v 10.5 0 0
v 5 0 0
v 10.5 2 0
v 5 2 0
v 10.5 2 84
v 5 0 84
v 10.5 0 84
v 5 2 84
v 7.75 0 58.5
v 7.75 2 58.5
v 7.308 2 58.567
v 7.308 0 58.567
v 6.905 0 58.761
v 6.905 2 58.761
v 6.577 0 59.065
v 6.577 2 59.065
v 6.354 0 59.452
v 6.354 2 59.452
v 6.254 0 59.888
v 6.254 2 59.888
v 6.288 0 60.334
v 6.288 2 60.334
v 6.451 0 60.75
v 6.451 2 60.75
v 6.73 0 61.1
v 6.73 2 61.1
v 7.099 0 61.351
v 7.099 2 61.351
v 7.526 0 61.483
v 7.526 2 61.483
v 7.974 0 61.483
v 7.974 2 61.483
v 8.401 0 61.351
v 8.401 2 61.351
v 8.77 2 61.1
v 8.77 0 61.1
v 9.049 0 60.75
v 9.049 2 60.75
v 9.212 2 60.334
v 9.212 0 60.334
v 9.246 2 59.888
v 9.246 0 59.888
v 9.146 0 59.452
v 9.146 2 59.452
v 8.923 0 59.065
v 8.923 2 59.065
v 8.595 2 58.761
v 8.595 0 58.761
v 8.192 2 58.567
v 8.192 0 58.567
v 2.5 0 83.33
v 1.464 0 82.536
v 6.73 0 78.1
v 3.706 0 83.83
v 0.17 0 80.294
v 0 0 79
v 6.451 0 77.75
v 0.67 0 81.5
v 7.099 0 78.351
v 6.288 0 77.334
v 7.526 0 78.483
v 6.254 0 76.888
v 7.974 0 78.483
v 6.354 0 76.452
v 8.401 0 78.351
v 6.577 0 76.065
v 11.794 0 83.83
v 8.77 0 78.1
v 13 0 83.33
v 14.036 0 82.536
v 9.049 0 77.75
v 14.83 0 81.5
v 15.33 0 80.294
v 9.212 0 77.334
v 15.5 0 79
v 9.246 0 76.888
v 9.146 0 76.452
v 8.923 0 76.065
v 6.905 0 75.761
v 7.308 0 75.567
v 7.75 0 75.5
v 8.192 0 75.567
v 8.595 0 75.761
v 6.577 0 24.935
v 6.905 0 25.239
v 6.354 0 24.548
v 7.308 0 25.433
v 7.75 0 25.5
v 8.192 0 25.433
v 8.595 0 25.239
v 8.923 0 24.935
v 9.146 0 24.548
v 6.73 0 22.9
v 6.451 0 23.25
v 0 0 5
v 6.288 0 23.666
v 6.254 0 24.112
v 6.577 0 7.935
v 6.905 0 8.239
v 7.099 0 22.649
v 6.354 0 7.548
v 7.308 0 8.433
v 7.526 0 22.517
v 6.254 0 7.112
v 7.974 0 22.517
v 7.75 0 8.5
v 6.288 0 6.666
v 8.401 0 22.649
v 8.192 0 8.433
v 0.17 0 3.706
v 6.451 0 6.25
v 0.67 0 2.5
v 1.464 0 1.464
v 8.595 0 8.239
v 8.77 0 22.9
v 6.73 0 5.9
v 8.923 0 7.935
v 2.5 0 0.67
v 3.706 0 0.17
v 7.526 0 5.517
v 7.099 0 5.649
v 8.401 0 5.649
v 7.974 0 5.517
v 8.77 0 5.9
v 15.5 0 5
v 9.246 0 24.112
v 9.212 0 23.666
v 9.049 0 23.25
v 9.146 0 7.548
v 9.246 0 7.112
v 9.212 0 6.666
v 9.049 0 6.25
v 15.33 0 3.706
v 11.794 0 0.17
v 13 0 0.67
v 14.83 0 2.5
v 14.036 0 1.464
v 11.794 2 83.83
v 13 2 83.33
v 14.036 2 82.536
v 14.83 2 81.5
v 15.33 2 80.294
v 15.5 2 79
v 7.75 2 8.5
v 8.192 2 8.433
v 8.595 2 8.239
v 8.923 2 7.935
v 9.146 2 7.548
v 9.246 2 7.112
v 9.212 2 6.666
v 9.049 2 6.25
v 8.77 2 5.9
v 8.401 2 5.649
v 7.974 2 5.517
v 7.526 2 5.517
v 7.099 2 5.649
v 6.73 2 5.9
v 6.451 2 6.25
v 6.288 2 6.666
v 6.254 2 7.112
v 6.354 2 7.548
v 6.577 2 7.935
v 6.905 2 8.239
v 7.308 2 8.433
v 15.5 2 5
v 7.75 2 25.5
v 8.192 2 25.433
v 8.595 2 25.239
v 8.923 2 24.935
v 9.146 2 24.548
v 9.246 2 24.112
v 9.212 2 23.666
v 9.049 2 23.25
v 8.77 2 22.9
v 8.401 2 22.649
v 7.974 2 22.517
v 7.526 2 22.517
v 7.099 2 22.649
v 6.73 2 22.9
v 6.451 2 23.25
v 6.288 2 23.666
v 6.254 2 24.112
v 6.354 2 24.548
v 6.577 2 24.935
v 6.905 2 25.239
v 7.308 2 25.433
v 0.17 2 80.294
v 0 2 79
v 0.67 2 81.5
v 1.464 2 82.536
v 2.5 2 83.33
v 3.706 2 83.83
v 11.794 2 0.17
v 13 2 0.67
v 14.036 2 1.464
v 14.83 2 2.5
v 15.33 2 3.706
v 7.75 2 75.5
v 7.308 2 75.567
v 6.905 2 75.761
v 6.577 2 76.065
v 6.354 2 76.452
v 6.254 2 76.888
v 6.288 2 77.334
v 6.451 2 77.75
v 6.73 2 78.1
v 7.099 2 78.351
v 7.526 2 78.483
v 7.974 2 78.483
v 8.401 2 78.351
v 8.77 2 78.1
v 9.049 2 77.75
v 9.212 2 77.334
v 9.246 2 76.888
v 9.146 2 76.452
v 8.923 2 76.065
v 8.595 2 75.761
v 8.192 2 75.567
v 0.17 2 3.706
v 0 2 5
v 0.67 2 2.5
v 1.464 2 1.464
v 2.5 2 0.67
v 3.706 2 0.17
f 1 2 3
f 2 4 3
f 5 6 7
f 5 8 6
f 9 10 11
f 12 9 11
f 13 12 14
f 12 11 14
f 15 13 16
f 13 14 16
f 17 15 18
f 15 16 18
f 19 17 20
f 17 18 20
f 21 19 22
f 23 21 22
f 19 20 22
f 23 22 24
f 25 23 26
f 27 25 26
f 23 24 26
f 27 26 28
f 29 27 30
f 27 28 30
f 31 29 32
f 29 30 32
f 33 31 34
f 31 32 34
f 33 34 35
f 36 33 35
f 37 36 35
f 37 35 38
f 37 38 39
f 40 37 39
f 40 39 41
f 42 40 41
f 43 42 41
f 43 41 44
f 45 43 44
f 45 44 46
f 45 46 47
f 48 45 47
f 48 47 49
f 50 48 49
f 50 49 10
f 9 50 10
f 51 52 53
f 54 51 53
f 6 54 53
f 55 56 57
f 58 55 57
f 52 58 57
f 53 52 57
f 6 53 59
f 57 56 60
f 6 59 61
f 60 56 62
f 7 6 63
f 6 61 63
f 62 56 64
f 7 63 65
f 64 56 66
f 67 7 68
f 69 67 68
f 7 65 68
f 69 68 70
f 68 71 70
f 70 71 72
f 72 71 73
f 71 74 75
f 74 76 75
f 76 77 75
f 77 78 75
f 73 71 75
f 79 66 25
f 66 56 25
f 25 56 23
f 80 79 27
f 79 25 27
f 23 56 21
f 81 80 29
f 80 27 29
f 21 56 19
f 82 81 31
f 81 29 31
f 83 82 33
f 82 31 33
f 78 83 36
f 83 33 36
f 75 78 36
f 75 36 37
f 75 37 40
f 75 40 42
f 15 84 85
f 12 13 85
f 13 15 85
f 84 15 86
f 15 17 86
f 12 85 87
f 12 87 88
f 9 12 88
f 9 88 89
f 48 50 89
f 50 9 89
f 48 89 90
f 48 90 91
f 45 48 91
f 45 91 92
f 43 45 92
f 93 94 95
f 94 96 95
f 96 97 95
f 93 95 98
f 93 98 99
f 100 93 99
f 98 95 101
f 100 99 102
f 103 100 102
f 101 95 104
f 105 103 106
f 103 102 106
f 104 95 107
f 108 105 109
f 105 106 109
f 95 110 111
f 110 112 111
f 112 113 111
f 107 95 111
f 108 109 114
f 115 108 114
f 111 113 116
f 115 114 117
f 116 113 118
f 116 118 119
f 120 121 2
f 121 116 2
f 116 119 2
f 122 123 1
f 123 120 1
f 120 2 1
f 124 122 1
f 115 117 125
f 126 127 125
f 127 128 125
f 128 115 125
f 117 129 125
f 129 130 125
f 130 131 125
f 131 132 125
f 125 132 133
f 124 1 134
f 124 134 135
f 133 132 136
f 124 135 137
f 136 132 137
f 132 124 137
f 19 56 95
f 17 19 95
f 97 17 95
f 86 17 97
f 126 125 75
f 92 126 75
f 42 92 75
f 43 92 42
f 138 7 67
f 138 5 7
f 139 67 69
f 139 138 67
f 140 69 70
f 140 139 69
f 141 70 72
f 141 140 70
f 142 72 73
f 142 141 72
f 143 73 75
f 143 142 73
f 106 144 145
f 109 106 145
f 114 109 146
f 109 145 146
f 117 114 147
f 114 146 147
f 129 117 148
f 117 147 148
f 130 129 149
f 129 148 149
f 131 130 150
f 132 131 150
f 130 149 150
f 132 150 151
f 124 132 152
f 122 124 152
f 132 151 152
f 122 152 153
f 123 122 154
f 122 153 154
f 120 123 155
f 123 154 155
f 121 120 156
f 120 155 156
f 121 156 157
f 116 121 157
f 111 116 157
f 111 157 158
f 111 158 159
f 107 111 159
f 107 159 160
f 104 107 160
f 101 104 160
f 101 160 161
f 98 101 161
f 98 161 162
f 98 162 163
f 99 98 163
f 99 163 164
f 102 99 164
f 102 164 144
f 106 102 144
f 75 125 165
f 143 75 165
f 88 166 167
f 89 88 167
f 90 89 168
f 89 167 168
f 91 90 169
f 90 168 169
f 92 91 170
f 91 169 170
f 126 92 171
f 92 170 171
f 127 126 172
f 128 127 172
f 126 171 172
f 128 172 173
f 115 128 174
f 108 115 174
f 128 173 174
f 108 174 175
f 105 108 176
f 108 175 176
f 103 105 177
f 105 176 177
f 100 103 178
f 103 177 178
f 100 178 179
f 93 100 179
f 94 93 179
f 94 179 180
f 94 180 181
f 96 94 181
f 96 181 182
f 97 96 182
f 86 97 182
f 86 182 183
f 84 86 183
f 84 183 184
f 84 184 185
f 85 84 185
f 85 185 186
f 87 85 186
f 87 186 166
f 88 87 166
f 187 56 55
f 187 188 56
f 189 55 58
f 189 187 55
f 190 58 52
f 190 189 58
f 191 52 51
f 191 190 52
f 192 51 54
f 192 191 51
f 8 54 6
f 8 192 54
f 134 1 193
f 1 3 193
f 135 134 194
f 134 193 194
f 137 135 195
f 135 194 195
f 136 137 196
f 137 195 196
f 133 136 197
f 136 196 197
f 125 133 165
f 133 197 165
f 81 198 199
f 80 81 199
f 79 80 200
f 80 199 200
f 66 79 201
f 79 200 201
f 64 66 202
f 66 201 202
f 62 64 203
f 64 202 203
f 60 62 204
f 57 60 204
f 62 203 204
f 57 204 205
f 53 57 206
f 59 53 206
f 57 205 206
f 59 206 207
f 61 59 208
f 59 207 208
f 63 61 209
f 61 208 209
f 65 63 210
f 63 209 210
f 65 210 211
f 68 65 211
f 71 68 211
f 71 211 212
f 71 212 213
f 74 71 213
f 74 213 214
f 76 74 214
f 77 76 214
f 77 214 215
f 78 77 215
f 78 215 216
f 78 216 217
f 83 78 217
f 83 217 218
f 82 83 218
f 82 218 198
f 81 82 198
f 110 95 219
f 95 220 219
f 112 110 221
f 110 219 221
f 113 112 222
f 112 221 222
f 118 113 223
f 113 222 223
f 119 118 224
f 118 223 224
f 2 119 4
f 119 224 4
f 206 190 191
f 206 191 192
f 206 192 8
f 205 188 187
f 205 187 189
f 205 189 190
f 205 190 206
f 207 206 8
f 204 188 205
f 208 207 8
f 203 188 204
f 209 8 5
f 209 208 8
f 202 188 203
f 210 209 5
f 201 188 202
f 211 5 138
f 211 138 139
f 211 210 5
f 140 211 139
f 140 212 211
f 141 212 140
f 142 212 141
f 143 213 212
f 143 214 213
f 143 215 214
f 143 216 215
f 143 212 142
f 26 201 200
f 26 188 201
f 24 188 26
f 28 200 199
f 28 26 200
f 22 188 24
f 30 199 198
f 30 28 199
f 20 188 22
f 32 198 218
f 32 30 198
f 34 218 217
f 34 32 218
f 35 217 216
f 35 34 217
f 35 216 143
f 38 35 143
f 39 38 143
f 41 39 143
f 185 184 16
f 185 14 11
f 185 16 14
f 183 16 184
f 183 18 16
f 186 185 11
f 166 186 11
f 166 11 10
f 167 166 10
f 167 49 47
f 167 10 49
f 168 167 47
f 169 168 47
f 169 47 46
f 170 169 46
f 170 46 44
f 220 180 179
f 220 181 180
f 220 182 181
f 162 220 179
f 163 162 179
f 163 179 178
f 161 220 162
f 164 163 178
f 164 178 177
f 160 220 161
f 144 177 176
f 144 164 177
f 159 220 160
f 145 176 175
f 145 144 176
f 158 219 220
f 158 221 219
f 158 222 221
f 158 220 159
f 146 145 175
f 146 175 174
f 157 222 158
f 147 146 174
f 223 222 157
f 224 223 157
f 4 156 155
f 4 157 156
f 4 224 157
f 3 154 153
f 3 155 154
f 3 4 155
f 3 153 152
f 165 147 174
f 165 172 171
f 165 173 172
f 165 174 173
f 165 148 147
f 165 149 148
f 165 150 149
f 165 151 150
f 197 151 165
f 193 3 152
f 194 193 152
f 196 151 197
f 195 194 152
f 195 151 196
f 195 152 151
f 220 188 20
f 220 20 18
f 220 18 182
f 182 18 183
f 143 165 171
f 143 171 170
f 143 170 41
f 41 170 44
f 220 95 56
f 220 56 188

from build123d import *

# Parameters (mm, degrees)
ESQUISSE1_W             = 15.5
ESQUISSE1_H             = 2
EXTRU_MINCE1_DEPTH      = 84
ESQUISSE2_R             = 1.5
ENL_V_MAT_EXTRU_1_DEPTH = 86.441500455
CONG_1_R                = 5


with BuildPart() as part:
    # Esquisse1 → Extru.-Mince1 (new body)
    with BuildSketch(Plane.XY):
        with Locations((7.75, 1)):
            Rectangle(ESQUISSE1_W, ESQUISSE1_H)
    extrude(amount=EXTRU_MINCE1_DEPTH)

    # Esquisse2 → Enlèv. mat.-Extru.1 (cut, through all)
    with BuildSketch(Plane(origin=(0, 2, 0), x_dir=(1, 0, 0), z_dir=(0, 1, 0))):
        with Locations(Location((7.75, -24, 0), (0, 0, 270))):
            Circle(ESQUISSE2_R)
        with Locations(Location((7.75, -7, 0), (0, 0, 270))):
            Circle(ESQUISSE2_R)
        with Locations(Location((7.75, -77, 0), (0, 0, 90))):
            Circle(ESQUISSE2_R)
        with Locations(Location((7.75, -60, 0), (0, 0, 90))):
            Circle(ESQUISSE2_R)
    extrude(amount=-ENL_V_MAT_EXTRU_1_DEPTH, mode=Mode.SUBTRACT)

    # Congé1
    cong_1_edges = [part.edges().sort_by_distance(p)[0] for p in [
        (0, 1, 84),
        (0, 1, 0),
        (15.5, 1, 0),
        (15.5, 1, 84),
    ]]
    fillet(cong_1_edges, radius=CONG_1_R)


solid = part.part
